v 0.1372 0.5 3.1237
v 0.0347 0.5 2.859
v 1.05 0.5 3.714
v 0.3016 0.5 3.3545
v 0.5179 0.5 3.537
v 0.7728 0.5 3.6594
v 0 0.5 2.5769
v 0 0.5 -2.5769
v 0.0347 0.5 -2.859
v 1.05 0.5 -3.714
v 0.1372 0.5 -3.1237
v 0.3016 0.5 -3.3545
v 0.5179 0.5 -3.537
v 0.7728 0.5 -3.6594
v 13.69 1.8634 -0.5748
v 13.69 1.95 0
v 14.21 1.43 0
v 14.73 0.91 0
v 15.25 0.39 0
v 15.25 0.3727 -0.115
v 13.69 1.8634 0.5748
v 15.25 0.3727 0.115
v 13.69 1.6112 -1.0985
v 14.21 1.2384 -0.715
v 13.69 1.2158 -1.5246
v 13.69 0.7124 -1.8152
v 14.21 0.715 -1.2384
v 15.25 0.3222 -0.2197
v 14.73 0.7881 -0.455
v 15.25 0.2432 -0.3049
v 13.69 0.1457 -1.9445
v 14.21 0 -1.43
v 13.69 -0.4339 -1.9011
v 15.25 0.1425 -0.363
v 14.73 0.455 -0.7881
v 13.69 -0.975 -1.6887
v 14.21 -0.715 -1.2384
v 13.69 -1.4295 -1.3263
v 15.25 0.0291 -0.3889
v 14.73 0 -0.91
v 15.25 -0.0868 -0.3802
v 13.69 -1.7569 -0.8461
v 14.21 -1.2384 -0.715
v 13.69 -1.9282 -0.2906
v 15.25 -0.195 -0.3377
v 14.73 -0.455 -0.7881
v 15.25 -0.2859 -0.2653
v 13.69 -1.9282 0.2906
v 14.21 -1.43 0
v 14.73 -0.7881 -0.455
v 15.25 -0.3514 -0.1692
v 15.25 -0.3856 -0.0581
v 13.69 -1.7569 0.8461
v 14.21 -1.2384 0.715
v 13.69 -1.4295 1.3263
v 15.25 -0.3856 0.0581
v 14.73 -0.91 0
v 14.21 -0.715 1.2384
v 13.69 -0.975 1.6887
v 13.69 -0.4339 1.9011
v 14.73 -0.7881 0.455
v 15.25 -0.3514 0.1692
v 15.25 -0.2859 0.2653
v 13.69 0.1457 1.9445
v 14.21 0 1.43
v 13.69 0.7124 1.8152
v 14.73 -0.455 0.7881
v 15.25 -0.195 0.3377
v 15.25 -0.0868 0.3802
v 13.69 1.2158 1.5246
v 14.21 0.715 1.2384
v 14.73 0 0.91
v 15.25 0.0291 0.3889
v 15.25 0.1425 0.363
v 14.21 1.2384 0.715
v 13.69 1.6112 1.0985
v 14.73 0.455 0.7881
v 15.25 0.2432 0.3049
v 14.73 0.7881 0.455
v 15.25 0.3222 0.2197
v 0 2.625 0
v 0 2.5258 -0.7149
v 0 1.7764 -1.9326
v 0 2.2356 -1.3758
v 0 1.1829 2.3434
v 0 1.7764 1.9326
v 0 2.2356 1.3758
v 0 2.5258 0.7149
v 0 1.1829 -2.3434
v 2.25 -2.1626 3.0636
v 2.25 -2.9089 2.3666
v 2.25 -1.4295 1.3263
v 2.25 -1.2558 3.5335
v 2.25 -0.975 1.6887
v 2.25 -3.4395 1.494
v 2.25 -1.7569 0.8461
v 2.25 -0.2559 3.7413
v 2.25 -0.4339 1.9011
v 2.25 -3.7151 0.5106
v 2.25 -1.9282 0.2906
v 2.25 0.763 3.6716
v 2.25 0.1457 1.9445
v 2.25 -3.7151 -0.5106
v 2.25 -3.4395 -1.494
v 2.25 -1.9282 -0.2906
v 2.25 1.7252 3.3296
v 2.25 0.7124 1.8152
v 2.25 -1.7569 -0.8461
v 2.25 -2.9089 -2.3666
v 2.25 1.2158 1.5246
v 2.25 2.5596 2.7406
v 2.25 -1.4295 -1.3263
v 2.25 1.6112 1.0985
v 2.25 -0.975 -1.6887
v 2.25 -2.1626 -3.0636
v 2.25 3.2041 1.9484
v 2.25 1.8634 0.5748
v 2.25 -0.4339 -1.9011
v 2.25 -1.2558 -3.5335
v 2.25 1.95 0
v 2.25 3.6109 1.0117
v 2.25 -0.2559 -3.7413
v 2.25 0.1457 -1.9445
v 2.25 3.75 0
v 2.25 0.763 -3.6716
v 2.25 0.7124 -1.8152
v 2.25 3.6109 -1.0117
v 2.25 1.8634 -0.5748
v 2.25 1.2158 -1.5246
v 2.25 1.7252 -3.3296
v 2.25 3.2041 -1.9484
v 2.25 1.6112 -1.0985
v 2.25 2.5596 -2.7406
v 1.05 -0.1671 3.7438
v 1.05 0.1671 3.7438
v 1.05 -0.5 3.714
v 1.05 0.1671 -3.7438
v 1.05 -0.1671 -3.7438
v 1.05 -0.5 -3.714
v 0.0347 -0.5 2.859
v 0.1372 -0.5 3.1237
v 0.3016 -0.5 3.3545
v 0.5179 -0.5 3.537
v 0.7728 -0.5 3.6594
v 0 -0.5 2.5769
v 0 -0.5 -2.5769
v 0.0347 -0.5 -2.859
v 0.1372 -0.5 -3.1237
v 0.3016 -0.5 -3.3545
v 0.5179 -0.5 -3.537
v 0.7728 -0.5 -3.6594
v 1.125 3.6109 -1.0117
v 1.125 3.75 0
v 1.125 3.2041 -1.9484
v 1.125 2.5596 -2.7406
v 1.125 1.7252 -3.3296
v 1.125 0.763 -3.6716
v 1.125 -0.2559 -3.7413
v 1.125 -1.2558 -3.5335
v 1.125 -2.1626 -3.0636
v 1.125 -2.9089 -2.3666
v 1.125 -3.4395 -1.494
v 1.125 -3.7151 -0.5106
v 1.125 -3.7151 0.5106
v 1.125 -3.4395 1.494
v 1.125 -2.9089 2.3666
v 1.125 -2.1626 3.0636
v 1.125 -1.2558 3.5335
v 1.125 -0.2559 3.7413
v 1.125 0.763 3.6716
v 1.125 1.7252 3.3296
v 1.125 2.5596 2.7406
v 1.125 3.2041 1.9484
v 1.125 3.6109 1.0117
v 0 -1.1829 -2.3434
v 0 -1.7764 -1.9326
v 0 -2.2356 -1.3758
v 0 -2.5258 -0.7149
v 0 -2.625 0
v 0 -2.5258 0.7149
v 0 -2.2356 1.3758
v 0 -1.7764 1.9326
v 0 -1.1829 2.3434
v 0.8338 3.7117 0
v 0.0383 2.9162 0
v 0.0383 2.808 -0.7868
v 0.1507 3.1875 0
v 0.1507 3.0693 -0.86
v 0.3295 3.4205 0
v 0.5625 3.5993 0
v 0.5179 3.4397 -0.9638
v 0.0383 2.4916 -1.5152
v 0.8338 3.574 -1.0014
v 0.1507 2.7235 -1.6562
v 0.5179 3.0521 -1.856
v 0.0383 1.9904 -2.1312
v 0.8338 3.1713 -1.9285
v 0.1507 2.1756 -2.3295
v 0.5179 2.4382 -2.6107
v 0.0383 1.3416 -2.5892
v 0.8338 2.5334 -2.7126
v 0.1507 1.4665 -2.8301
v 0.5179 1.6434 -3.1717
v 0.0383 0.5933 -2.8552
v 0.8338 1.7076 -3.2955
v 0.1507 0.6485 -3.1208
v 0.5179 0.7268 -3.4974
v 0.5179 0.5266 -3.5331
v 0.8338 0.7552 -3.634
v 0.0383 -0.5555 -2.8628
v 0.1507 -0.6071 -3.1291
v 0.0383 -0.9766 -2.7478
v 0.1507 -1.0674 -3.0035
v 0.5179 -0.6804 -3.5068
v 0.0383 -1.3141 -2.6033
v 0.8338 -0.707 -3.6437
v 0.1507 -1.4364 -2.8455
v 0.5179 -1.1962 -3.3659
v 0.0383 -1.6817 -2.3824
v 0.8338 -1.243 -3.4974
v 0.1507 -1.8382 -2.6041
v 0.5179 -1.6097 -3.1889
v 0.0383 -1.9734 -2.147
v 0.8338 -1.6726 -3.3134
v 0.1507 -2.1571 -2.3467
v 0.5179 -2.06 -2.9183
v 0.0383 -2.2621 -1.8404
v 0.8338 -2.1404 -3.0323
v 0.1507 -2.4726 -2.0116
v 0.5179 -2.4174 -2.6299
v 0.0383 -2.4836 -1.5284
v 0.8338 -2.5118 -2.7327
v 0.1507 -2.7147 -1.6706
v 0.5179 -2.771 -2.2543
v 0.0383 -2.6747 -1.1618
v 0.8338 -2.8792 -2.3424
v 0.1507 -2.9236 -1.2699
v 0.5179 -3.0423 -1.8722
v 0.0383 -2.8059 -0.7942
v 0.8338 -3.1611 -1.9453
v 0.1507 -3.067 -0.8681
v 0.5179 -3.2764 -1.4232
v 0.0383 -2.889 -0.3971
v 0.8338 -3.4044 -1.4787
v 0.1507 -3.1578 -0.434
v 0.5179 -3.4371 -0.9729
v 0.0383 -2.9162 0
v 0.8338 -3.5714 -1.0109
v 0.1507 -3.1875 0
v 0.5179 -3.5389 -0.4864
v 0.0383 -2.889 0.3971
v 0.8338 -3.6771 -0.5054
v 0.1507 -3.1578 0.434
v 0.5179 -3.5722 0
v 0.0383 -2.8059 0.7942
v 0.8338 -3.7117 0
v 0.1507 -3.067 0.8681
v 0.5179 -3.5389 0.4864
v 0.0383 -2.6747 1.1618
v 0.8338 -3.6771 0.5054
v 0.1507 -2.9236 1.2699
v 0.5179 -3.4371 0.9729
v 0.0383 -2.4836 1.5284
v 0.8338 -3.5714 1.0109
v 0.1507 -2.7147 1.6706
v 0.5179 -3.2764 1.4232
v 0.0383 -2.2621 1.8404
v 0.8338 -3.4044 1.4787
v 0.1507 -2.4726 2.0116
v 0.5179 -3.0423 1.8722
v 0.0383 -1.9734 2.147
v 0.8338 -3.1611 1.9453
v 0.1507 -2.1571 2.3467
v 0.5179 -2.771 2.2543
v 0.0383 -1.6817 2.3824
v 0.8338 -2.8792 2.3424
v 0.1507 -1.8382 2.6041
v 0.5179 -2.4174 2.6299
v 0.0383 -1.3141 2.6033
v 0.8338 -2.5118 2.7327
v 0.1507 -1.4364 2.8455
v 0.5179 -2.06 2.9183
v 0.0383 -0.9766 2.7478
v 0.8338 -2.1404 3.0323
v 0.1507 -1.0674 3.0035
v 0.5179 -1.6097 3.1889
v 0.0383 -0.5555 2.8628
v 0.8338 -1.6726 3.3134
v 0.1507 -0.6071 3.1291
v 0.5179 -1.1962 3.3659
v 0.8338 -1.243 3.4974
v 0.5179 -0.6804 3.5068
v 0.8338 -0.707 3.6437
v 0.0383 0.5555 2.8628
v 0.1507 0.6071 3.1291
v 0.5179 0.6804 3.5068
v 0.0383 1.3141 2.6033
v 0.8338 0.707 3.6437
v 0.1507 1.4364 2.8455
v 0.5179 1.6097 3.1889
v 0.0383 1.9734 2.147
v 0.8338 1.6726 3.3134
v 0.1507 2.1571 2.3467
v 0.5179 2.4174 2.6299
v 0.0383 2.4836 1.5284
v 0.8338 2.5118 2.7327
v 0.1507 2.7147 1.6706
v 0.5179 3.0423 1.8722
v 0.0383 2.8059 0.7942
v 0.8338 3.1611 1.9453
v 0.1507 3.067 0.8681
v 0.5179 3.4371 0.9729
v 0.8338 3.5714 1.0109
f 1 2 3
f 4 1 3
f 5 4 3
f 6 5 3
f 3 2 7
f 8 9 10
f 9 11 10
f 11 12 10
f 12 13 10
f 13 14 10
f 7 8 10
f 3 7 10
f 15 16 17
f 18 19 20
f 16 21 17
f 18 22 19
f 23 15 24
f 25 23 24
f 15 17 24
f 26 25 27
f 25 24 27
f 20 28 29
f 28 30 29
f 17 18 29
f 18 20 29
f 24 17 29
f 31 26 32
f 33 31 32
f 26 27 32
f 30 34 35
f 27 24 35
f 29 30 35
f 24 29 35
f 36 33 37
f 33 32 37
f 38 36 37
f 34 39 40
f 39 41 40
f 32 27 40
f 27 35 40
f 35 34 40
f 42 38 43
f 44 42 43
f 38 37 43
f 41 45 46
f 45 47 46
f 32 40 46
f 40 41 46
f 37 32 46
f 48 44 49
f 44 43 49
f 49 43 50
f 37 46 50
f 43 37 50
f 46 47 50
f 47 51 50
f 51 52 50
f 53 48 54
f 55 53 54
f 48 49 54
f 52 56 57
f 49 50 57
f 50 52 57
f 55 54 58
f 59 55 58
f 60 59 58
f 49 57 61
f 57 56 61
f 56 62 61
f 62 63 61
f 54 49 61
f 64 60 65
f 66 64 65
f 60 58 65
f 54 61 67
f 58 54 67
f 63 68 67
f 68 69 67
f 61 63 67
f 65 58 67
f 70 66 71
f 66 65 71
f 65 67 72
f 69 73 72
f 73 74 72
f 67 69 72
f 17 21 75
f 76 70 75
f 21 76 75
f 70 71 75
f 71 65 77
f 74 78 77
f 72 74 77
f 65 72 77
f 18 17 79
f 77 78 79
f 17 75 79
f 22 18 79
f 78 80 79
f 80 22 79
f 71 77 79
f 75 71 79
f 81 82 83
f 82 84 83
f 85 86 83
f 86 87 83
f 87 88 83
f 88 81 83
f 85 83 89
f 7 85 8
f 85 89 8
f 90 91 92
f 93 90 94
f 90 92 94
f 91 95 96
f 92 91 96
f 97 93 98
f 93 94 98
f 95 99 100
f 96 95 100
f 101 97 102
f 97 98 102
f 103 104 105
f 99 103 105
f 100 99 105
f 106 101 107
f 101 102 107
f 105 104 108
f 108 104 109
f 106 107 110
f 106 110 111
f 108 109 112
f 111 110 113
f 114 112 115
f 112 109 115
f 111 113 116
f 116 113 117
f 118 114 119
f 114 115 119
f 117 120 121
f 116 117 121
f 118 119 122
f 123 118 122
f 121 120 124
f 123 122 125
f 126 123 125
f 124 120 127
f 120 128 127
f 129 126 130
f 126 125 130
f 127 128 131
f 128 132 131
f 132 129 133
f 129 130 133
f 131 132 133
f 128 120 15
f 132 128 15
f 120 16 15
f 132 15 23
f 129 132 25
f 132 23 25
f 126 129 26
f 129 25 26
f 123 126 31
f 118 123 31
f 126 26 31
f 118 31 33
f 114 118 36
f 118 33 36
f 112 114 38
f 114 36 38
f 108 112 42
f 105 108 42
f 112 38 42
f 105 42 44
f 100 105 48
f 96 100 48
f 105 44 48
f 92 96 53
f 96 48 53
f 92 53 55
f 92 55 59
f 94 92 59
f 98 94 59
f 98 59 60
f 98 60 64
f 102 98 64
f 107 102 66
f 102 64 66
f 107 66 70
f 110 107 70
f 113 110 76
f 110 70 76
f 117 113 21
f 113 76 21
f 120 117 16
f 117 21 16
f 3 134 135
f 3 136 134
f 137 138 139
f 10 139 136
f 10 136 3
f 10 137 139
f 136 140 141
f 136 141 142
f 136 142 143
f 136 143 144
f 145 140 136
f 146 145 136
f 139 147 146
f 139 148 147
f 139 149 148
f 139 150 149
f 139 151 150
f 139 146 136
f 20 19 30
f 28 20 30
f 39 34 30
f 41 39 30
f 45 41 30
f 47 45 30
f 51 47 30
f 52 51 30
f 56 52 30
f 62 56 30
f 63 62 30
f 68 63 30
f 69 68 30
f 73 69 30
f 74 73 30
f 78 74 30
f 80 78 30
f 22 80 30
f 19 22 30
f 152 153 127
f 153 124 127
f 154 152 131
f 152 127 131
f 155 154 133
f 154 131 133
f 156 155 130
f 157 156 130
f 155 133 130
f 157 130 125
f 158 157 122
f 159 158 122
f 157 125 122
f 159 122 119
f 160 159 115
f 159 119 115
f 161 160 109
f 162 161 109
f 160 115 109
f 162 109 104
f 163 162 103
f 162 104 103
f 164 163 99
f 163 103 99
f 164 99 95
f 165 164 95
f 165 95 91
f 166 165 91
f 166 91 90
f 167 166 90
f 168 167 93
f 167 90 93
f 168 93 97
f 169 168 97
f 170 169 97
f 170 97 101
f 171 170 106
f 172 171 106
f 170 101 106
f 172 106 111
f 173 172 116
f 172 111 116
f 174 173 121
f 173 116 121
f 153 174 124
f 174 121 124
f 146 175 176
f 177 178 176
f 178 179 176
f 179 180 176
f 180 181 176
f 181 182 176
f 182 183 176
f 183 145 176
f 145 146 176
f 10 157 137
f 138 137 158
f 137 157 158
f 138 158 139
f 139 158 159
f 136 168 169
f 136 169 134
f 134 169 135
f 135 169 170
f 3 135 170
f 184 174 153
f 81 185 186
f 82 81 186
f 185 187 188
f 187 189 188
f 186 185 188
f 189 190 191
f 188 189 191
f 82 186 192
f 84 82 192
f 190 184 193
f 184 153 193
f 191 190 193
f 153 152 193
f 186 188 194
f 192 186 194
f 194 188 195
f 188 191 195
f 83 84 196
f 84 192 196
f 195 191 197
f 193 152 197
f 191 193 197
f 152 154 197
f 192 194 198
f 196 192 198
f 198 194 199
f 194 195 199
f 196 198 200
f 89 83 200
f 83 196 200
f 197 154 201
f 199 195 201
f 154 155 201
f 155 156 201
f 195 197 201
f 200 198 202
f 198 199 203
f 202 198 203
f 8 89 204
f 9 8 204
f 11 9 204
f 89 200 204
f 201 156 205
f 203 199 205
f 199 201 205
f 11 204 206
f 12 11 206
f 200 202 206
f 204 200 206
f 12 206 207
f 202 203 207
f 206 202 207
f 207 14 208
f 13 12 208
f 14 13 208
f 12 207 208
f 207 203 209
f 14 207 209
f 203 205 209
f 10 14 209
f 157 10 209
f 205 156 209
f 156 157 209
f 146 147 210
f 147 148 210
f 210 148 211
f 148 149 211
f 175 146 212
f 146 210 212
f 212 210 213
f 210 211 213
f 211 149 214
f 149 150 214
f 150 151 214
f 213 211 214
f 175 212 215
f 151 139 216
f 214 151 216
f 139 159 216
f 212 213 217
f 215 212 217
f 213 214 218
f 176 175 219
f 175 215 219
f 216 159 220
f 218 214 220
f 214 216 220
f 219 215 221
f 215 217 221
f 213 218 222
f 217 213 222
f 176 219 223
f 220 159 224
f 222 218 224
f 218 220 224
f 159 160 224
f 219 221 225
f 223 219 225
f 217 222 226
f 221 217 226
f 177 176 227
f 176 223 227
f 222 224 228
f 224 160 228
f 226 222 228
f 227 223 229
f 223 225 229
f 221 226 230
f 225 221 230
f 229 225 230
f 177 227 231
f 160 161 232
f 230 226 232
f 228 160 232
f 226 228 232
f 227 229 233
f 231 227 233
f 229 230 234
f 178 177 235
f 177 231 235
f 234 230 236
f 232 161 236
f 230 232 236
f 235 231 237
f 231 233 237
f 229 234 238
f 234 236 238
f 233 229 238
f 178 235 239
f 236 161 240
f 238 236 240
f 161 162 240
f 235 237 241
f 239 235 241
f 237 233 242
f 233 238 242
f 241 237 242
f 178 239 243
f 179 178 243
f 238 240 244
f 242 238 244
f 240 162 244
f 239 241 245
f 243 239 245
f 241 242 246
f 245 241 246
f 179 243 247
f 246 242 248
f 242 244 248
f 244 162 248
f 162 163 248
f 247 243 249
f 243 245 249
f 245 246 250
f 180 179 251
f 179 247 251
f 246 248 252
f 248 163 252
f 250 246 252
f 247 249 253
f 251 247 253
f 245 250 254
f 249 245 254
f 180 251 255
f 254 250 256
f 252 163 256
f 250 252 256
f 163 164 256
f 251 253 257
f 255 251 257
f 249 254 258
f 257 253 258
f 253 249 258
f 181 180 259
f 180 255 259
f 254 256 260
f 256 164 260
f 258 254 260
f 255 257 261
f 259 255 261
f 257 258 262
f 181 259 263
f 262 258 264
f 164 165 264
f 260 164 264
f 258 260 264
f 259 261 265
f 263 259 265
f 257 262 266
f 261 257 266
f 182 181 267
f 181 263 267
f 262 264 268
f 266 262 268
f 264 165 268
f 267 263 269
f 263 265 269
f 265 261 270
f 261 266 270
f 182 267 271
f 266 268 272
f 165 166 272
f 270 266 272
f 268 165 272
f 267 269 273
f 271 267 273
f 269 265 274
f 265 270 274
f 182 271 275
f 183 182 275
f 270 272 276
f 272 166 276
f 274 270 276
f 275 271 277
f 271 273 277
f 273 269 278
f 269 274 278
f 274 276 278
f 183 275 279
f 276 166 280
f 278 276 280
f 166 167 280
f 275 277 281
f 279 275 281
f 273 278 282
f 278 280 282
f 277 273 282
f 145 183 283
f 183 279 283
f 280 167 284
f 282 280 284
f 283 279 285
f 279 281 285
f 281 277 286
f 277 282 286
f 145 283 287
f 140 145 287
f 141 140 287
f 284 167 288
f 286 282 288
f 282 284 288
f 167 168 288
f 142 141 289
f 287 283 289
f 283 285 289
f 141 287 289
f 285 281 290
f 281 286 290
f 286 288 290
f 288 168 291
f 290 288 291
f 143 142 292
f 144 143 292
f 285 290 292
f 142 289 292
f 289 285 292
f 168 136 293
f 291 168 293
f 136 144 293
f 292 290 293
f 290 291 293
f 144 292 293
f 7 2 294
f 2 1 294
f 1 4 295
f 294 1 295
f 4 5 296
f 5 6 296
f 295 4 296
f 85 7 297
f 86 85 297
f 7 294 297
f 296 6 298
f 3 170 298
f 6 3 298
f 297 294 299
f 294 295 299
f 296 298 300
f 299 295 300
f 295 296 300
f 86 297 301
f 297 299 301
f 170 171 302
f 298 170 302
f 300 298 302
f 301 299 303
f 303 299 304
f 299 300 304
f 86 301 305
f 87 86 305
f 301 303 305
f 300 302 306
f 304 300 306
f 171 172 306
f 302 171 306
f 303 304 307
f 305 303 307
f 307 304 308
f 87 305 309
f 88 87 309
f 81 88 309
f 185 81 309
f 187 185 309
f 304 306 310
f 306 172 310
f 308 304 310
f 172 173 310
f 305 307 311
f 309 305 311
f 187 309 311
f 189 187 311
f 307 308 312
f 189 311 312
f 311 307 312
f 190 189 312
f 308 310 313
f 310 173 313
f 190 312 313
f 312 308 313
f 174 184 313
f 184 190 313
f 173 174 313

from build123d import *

# Parameters (mm, degrees)
CUT_EXTRUDE1_DEPTH      = 17.145819892
CUT_EXTRUDE1_DEPTH_BACK = 17.145819892
SKETCH2_W               = 1.05
SKETCH2_H               = 1


with BuildPart() as part:
    # Sketch1 → Revolve1 (revolve)
    with BuildSketch(Plane.XY):
        with BuildLine():
            Line((0, 0), (0, 2.625))
            ThreePointArc((0, 2.625), (0.329504871, 3.420495129), (1.125, 3.75))
            Line((1.125, 3.75), (2.25, 3.75))
            Line((2.25, 3.75), (2.25, 1.95))
            Line((2.25, 1.95), (13.69, 1.95))
            Line((13.69, 1.95), (15.25, 0.39))
            Line((15.25, 0.39), (15.25, 0))
            Line((15.25, 0), (0, 0))
        make_face()
    revolve(axis=Axis((15.25, 0, 0), (-1, 0, 0)))

    # Sketch2 → Cut-Extrude1 (cut, two sides: drawn at the far end of the back side and taken through both)
    with BuildSketch(Plane.XY.offset(-CUT_EXTRUDE1_DEPTH_BACK)):
        with Locations((0.525, 0)):
            Rectangle(SKETCH2_W, SKETCH2_H)
    extrude(amount=CUT_EXTRUDE1_DEPTH + CUT_EXTRUDE1_DEPTH_BACK, mode=Mode.SUBTRACT)


solid = part.part
